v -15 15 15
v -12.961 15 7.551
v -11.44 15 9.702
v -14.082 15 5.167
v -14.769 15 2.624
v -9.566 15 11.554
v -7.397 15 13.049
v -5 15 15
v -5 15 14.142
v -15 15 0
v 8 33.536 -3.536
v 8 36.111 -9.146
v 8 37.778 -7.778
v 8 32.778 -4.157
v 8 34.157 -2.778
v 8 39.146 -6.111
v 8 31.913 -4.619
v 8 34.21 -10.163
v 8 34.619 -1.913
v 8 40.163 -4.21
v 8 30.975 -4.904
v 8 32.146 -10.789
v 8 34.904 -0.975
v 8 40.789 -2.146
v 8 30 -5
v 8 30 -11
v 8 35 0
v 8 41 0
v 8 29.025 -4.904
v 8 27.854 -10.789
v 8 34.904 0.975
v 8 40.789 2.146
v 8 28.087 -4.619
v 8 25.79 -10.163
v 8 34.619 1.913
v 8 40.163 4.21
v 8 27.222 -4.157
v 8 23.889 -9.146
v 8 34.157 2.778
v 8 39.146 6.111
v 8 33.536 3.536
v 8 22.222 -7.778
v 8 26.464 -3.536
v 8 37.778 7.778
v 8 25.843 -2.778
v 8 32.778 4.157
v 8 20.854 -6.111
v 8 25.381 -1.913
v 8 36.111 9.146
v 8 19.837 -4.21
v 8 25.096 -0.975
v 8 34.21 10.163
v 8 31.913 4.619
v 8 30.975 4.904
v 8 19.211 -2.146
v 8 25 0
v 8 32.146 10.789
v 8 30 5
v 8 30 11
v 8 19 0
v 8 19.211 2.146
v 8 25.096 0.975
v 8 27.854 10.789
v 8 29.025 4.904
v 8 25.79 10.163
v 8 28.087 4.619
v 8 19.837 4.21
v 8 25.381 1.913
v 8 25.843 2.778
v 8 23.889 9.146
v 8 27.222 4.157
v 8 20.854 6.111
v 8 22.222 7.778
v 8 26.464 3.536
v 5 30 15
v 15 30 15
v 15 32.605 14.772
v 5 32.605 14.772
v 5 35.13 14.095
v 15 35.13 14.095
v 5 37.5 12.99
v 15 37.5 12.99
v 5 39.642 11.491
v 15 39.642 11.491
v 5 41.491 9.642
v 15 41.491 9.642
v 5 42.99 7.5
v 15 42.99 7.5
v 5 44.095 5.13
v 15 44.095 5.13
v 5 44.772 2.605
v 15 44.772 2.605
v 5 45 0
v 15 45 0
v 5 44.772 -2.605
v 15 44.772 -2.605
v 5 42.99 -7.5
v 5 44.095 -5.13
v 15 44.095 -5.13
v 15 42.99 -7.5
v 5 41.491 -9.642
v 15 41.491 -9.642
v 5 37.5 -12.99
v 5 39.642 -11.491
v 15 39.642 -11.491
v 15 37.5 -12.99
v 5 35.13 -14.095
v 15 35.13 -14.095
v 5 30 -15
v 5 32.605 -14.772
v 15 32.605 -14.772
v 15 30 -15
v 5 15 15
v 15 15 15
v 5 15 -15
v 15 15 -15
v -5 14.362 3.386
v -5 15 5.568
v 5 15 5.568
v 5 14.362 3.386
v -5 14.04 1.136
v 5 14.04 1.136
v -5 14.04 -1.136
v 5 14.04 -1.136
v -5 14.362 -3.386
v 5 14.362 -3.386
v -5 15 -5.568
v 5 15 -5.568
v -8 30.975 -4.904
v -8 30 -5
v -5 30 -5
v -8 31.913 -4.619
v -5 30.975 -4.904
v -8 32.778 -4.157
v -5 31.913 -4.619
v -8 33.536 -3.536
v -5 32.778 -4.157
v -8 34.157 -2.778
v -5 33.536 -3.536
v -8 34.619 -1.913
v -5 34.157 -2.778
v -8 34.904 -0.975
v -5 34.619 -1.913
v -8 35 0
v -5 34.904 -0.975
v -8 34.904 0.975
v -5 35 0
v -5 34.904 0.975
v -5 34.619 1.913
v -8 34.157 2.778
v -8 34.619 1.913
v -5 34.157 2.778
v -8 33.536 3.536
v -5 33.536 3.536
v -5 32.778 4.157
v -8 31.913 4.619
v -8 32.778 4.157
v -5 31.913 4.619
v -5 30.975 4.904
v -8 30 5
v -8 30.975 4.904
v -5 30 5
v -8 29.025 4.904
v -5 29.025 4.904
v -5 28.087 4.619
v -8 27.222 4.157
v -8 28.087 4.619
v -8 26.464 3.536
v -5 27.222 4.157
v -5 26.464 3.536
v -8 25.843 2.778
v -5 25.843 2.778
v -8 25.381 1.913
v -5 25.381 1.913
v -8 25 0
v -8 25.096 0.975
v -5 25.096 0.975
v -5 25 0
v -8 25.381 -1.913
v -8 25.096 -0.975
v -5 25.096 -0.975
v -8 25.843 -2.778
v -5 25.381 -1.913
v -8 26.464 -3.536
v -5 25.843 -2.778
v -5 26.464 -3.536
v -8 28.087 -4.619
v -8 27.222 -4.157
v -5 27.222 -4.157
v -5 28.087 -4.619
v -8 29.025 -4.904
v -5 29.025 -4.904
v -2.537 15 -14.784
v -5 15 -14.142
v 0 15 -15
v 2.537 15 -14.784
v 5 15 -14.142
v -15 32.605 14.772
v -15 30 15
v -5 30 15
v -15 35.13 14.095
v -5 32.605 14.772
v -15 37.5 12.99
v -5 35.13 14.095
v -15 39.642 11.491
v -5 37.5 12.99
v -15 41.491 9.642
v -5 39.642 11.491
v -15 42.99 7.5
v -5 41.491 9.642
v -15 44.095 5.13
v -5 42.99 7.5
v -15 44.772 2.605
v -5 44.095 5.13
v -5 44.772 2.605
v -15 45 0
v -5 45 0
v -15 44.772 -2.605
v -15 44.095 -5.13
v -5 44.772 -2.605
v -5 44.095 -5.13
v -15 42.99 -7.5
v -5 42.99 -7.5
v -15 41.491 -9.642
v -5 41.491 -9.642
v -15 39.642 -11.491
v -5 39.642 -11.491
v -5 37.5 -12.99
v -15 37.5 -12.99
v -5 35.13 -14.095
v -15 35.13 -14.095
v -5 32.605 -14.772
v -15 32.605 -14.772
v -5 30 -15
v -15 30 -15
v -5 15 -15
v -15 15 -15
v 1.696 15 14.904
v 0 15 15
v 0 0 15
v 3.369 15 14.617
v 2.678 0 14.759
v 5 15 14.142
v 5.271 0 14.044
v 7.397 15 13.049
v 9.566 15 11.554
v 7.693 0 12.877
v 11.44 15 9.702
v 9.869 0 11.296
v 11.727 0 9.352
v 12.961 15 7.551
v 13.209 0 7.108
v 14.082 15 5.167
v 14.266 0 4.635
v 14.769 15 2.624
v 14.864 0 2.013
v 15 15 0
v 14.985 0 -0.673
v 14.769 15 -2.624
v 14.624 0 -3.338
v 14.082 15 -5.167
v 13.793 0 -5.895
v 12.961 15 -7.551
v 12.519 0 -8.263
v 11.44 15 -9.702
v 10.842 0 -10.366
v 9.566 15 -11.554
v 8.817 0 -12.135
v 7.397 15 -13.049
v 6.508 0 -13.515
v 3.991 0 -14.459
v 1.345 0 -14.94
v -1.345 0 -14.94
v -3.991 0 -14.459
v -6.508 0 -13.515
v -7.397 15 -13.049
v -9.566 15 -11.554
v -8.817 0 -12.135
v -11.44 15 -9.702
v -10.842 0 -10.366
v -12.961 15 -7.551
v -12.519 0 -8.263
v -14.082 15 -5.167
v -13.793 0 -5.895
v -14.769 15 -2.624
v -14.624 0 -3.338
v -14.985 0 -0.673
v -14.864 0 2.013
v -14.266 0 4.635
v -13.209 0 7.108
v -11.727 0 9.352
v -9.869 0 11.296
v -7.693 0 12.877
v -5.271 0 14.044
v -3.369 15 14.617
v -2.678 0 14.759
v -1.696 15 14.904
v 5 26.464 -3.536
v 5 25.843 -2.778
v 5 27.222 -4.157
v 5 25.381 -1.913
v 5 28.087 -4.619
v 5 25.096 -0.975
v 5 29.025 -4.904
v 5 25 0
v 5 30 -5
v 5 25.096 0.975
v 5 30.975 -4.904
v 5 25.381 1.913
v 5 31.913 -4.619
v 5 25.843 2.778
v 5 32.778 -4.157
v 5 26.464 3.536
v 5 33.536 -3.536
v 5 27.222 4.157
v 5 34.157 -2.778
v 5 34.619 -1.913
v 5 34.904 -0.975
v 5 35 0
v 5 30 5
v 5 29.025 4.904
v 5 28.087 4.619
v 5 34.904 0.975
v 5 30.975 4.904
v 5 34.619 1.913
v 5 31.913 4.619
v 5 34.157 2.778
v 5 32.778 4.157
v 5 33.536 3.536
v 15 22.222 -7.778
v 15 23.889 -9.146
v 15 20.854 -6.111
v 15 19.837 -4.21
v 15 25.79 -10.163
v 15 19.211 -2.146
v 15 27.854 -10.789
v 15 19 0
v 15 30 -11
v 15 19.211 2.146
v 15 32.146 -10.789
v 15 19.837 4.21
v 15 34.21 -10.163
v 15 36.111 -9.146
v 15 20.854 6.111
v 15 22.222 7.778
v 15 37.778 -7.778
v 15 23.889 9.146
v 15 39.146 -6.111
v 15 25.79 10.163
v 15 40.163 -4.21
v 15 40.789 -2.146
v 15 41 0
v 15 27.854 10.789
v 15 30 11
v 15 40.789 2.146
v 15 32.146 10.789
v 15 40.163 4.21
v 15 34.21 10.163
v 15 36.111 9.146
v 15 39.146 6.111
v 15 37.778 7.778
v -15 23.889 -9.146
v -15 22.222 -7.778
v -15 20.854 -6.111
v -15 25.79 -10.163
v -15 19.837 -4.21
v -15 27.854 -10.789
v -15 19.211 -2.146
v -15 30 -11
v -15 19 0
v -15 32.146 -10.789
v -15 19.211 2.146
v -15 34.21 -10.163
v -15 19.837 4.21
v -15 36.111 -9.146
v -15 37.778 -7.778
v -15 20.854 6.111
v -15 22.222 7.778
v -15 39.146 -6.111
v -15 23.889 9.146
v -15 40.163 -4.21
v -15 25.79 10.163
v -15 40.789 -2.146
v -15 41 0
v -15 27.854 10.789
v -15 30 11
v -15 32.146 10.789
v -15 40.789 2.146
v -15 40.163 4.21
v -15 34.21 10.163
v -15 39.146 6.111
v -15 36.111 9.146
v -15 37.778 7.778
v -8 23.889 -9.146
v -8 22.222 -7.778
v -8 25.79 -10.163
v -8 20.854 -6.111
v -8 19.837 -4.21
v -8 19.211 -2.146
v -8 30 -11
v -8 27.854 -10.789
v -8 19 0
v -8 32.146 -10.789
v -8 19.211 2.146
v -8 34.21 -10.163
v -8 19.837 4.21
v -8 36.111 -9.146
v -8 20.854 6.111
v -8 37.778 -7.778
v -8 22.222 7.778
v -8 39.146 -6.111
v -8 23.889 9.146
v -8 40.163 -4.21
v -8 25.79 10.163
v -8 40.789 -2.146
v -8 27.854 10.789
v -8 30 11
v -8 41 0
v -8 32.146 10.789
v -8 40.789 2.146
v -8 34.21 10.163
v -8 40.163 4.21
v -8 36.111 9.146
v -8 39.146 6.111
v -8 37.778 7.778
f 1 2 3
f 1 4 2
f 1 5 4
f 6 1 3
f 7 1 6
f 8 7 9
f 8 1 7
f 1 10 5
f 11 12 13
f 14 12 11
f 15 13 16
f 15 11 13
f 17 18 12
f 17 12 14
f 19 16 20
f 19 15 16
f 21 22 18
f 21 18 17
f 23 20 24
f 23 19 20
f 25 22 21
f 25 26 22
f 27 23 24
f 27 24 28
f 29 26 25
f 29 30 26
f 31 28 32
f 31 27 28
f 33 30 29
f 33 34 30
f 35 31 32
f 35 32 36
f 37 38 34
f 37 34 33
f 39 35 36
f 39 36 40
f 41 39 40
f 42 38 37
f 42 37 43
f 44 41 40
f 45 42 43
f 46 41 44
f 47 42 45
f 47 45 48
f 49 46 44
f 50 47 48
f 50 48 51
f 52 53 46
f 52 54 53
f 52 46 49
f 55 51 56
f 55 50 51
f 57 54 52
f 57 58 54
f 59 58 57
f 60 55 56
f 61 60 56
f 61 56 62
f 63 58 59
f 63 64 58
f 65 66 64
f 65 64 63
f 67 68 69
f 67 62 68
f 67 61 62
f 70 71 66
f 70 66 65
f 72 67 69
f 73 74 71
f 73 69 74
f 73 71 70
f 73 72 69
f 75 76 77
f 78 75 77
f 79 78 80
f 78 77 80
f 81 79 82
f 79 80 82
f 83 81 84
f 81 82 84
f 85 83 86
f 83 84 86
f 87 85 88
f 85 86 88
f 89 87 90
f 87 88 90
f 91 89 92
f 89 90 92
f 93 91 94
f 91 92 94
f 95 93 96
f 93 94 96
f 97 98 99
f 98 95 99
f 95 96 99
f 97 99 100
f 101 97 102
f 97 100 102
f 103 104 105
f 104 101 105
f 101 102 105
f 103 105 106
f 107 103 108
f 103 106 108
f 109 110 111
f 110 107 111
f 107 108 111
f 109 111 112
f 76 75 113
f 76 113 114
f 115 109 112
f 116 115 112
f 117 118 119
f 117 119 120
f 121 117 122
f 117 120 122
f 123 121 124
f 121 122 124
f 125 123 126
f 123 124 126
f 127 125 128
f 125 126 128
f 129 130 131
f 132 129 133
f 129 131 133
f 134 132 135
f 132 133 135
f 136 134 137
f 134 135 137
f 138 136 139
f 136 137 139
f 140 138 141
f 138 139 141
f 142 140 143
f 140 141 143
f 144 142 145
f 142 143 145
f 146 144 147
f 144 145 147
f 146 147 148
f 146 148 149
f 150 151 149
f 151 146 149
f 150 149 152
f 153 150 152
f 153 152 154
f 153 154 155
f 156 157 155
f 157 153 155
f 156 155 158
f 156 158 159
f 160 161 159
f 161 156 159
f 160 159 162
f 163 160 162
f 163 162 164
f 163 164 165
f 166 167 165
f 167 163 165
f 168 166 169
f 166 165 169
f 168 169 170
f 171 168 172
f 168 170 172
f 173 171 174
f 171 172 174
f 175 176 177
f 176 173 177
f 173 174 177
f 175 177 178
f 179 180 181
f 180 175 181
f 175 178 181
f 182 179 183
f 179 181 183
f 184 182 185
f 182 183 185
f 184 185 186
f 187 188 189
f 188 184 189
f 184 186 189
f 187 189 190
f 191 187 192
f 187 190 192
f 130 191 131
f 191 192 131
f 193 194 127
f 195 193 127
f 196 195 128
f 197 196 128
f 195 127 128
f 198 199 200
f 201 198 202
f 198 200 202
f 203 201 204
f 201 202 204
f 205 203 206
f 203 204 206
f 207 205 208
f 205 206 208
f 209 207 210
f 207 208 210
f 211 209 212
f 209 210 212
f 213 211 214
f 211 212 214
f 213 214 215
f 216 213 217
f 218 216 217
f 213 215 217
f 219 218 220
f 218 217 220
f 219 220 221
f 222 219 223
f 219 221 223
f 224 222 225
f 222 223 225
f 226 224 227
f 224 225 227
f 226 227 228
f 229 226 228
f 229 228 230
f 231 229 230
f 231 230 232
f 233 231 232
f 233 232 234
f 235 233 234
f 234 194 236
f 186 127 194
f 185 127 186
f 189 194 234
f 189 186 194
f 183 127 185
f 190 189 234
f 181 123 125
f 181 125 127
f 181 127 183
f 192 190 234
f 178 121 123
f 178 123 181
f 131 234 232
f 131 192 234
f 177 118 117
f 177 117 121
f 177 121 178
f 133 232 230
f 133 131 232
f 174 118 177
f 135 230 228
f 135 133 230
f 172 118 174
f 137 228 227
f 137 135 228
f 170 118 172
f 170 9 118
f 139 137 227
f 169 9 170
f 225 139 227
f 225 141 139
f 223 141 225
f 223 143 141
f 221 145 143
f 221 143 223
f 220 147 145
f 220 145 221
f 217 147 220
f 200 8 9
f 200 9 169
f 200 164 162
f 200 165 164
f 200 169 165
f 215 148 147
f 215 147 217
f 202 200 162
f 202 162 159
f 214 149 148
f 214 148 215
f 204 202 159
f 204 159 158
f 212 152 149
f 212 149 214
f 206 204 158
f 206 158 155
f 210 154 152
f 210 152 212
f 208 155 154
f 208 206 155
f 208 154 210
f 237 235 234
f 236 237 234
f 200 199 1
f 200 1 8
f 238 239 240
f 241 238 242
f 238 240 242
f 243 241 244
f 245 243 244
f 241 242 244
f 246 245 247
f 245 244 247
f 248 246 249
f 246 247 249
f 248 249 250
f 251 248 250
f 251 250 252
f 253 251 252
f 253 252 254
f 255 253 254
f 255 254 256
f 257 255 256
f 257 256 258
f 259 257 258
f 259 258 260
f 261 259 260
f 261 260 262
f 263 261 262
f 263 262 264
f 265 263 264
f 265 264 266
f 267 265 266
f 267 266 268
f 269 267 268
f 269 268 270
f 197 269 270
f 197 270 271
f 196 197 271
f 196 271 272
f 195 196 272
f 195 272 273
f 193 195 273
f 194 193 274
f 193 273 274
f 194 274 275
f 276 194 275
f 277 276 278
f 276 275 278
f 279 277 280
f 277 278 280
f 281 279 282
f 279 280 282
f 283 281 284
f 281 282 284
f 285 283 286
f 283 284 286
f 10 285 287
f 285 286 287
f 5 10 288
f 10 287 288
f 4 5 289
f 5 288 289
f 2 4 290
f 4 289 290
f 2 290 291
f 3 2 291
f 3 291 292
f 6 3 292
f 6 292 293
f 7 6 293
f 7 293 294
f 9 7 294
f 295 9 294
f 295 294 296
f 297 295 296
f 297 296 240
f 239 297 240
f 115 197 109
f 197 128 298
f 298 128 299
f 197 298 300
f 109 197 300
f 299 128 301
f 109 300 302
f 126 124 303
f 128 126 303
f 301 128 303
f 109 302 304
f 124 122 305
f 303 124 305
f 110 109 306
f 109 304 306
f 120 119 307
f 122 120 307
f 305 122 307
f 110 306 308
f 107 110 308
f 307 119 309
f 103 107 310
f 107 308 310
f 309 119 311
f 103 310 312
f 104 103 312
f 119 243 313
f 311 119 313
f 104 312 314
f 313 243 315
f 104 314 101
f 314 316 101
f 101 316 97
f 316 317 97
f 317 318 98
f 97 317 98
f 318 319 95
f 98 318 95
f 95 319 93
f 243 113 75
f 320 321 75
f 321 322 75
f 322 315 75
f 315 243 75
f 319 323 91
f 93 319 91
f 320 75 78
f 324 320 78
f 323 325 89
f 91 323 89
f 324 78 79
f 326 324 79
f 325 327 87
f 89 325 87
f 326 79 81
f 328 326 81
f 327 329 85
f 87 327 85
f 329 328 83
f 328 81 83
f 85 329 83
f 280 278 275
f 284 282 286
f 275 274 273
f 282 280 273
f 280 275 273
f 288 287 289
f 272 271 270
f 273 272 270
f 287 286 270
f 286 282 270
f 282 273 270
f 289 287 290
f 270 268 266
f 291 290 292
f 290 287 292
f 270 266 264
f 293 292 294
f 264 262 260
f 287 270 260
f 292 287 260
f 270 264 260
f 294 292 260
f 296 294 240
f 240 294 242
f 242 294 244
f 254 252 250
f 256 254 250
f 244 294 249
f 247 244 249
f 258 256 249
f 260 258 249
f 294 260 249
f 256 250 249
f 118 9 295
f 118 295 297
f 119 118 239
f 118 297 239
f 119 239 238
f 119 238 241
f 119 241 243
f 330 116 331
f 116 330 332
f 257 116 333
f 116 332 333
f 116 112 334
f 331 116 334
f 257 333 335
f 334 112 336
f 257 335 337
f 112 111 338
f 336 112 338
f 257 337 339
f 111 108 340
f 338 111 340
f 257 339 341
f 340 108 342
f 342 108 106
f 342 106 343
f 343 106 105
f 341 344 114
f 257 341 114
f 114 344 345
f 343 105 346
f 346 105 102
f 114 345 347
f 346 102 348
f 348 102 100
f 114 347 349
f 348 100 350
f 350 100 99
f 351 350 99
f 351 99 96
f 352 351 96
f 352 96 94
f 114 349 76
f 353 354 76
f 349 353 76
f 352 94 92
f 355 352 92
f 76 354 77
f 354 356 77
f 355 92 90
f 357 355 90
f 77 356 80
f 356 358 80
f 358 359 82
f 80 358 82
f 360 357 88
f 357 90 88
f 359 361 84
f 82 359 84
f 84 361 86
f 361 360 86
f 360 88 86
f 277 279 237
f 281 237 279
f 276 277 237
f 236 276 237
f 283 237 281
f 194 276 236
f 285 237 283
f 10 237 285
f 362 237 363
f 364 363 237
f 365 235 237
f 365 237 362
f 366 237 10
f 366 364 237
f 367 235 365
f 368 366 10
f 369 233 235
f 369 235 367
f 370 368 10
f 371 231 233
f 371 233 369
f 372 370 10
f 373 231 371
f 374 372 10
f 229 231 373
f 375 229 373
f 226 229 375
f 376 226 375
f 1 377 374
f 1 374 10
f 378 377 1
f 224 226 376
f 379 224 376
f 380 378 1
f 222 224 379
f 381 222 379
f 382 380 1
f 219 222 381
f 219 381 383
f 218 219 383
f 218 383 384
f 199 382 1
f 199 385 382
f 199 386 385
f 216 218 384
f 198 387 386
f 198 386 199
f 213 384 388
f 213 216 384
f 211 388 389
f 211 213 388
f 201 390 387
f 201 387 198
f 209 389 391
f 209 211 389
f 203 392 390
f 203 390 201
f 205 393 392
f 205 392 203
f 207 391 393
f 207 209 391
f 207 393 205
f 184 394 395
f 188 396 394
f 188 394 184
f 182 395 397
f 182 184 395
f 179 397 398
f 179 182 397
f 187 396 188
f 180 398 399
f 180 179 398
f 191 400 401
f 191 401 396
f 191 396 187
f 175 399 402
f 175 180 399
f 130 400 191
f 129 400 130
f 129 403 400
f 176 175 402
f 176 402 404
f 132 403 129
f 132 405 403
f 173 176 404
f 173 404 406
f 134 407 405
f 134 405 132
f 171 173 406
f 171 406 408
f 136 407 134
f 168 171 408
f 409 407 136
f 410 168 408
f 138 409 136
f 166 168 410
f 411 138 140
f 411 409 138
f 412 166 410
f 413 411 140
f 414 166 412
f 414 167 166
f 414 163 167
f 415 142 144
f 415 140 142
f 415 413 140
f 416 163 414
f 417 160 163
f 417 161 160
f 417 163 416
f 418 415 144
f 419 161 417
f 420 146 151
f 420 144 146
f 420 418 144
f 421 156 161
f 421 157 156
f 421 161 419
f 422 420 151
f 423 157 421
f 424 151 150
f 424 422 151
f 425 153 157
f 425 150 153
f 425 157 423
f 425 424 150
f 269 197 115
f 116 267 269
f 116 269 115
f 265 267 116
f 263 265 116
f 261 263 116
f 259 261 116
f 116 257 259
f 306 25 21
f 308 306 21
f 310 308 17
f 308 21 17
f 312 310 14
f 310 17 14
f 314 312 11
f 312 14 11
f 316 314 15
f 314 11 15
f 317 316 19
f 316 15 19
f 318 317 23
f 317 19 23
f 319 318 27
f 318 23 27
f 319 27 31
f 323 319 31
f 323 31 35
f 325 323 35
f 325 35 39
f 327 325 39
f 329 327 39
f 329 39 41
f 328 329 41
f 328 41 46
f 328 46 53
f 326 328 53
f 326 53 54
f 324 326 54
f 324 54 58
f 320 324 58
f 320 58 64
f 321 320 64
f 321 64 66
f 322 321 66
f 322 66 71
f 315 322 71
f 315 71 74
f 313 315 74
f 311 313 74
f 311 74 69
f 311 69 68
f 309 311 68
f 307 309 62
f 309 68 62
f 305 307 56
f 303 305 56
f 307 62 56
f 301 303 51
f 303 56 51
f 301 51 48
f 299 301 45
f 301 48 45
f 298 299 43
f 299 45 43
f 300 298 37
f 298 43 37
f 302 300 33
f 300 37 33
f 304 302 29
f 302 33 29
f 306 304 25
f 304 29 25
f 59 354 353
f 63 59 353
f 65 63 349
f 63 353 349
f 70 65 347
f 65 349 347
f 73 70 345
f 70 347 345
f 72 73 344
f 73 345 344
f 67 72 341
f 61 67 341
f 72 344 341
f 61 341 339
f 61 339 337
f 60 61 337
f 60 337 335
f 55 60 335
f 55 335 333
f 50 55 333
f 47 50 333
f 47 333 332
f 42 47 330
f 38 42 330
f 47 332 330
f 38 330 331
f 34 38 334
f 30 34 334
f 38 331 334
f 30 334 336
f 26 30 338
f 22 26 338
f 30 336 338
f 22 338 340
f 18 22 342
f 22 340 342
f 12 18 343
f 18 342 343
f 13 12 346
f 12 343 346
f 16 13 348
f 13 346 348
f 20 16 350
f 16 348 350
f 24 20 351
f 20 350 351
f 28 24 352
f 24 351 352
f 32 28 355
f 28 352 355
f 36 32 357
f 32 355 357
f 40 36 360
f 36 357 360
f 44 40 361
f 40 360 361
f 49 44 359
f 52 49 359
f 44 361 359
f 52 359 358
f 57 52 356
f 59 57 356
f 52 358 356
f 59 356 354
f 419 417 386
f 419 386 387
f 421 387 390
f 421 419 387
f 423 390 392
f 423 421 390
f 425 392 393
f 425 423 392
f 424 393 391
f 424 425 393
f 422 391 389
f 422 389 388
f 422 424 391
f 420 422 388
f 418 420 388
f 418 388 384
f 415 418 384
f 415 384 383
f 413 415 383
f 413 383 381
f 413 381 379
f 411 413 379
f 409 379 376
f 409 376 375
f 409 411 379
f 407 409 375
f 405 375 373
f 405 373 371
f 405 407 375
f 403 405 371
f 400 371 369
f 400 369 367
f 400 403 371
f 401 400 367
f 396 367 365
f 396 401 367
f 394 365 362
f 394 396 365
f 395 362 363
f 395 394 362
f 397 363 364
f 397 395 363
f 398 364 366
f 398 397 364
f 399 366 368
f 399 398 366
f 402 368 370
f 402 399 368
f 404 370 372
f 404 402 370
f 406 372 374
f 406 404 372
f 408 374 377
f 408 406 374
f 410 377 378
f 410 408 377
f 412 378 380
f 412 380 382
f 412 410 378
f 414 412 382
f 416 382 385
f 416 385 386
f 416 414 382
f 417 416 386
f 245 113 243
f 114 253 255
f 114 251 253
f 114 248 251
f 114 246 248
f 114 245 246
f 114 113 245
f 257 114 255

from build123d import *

# Parameters (mm, degrees)
SKETCH1_R           = 15
BOSS_EXTRUDE1_DEPTH = 30
SKETCH8_W           = 30
SKETCH8_H           = 15
REVOLVE1_ANGLE      = 180
SKETCH9_W           = 30
SKETCH9_H           = 30
BOSS_EXTRUDE3_DEPTH = 15
SKETCH10_R          = 5
CUT_EXTRUDE1_DEPTH  = 30
SKETCH13_R          = 16
CUT_EXTRUDE2_DEPTH  = 10
SKETCH14_W          = 10
SKETCH14_H          = 15
CUT_EXTRUDE3_DEPTH  = 67
CUT_EXTRUDE4_START  = -7
SKETCH15_R          = 11
SKETCH15_R_2        = 5
CUT_EXTRUDE4_DEPTH  = 7
SKETCH16_R          = 11
SKETCH16_R_2        = 5
CUT_EXTRUDE5_DEPTH  = 7


with BuildPart() as part:
    # Sketch1 → Boss-Extrude1 (new body)
    with BuildSketch(Plane(origin=(0, 0, 0), x_dir=(1, 0, 0), z_dir=(0, 1, 0))):
        with Locations(Location((0, 0, 0), (0, 0, 270))):
            Circle(SKETCH1_R)
    extrude(amount=BOSS_EXTRUDE1_DEPTH)

    # Sketch8 → Revolve1 (revolve)
    with BuildSketch(Plane(origin=(0, 30, 0), x_dir=(1, 0, 0), z_dir=(0, 1, 0))):
        with Locations((0, -7.5)):
            Rectangle(SKETCH8_W, SKETCH8_H)
    revolve(axis=Axis((15, 30, 0), (-1, 0, 0)), revolution_arc=REVOLVE1_ANGLE)

    # Sketch9 → Boss-Extrude3 (add)
    with BuildSketch(Plane.XZ.offset(-30)):
        Rectangle(SKETCH9_W, SKETCH9_H)
    extrude(amount=BOSS_EXTRUDE3_DEPTH)

    # Sketch10 → Cut-Extrude1 (cut)
    with BuildSketch(Plane(origin=(15, 0, 0), x_dir=(0, 0, -1), z_dir=(1, 0, 0))):
        with Locations((0, 30)):
            Circle(SKETCH10_R)
    extrude(amount=-CUT_EXTRUDE1_DEPTH, mode=Mode.SUBTRACT)

    # Sketch13 → Cut-Extrude2 (cut)
    with BuildSketch(Plane(origin=(5, 0, 0), x_dir=(0, 0, -1), z_dir=(1, 0, 0))):
        with Locations((0, 30)):
            Circle(SKETCH13_R)
    extrude(amount=-CUT_EXTRUDE2_DEPTH, mode=Mode.SUBTRACT)

    # Sketch14 → Cut-Extrude3 (cut)
    with BuildSketch(Plane.XY.offset(15)):
        with Locations((0, 22.5)):
            Rectangle(SKETCH14_W, SKETCH14_H)
    extrude(amount=-CUT_EXTRUDE3_DEPTH, mode=Mode.SUBTRACT)

    # Sketch15 → Cut-Extrude4 (cut)
    with BuildSketch(Plane.ZY.offset(15).offset(CUT_EXTRUDE4_START)):
        with Locations((0, 30)):
            Circle(SKETCH15_R)
        with Locations(Location((0, 30, 0), (0, 0, 180))):
            Circle(SKETCH15_R_2, mode=Mode.SUBTRACT)
    extrude(amount=CUT_EXTRUDE4_DEPTH, mode=Mode.SUBTRACT)

    # Sketch16 → Cut-Extrude5 (cut)
    with BuildSketch(Plane(origin=(15, 0, 0), x_dir=(0, 0, -1), z_dir=(1, 0, 0))):
        with Locations(Location((0, 30, 0), (0, 0, 180))):
            Circle(SKETCH16_R)
        with Locations((0, 30)):
            Circle(SKETCH16_R_2, mode=Mode.SUBTRACT)
    extrude(amount=-CUT_EXTRUDE5_DEPTH, mode=Mode.SUBTRACT)


solid = part.part
